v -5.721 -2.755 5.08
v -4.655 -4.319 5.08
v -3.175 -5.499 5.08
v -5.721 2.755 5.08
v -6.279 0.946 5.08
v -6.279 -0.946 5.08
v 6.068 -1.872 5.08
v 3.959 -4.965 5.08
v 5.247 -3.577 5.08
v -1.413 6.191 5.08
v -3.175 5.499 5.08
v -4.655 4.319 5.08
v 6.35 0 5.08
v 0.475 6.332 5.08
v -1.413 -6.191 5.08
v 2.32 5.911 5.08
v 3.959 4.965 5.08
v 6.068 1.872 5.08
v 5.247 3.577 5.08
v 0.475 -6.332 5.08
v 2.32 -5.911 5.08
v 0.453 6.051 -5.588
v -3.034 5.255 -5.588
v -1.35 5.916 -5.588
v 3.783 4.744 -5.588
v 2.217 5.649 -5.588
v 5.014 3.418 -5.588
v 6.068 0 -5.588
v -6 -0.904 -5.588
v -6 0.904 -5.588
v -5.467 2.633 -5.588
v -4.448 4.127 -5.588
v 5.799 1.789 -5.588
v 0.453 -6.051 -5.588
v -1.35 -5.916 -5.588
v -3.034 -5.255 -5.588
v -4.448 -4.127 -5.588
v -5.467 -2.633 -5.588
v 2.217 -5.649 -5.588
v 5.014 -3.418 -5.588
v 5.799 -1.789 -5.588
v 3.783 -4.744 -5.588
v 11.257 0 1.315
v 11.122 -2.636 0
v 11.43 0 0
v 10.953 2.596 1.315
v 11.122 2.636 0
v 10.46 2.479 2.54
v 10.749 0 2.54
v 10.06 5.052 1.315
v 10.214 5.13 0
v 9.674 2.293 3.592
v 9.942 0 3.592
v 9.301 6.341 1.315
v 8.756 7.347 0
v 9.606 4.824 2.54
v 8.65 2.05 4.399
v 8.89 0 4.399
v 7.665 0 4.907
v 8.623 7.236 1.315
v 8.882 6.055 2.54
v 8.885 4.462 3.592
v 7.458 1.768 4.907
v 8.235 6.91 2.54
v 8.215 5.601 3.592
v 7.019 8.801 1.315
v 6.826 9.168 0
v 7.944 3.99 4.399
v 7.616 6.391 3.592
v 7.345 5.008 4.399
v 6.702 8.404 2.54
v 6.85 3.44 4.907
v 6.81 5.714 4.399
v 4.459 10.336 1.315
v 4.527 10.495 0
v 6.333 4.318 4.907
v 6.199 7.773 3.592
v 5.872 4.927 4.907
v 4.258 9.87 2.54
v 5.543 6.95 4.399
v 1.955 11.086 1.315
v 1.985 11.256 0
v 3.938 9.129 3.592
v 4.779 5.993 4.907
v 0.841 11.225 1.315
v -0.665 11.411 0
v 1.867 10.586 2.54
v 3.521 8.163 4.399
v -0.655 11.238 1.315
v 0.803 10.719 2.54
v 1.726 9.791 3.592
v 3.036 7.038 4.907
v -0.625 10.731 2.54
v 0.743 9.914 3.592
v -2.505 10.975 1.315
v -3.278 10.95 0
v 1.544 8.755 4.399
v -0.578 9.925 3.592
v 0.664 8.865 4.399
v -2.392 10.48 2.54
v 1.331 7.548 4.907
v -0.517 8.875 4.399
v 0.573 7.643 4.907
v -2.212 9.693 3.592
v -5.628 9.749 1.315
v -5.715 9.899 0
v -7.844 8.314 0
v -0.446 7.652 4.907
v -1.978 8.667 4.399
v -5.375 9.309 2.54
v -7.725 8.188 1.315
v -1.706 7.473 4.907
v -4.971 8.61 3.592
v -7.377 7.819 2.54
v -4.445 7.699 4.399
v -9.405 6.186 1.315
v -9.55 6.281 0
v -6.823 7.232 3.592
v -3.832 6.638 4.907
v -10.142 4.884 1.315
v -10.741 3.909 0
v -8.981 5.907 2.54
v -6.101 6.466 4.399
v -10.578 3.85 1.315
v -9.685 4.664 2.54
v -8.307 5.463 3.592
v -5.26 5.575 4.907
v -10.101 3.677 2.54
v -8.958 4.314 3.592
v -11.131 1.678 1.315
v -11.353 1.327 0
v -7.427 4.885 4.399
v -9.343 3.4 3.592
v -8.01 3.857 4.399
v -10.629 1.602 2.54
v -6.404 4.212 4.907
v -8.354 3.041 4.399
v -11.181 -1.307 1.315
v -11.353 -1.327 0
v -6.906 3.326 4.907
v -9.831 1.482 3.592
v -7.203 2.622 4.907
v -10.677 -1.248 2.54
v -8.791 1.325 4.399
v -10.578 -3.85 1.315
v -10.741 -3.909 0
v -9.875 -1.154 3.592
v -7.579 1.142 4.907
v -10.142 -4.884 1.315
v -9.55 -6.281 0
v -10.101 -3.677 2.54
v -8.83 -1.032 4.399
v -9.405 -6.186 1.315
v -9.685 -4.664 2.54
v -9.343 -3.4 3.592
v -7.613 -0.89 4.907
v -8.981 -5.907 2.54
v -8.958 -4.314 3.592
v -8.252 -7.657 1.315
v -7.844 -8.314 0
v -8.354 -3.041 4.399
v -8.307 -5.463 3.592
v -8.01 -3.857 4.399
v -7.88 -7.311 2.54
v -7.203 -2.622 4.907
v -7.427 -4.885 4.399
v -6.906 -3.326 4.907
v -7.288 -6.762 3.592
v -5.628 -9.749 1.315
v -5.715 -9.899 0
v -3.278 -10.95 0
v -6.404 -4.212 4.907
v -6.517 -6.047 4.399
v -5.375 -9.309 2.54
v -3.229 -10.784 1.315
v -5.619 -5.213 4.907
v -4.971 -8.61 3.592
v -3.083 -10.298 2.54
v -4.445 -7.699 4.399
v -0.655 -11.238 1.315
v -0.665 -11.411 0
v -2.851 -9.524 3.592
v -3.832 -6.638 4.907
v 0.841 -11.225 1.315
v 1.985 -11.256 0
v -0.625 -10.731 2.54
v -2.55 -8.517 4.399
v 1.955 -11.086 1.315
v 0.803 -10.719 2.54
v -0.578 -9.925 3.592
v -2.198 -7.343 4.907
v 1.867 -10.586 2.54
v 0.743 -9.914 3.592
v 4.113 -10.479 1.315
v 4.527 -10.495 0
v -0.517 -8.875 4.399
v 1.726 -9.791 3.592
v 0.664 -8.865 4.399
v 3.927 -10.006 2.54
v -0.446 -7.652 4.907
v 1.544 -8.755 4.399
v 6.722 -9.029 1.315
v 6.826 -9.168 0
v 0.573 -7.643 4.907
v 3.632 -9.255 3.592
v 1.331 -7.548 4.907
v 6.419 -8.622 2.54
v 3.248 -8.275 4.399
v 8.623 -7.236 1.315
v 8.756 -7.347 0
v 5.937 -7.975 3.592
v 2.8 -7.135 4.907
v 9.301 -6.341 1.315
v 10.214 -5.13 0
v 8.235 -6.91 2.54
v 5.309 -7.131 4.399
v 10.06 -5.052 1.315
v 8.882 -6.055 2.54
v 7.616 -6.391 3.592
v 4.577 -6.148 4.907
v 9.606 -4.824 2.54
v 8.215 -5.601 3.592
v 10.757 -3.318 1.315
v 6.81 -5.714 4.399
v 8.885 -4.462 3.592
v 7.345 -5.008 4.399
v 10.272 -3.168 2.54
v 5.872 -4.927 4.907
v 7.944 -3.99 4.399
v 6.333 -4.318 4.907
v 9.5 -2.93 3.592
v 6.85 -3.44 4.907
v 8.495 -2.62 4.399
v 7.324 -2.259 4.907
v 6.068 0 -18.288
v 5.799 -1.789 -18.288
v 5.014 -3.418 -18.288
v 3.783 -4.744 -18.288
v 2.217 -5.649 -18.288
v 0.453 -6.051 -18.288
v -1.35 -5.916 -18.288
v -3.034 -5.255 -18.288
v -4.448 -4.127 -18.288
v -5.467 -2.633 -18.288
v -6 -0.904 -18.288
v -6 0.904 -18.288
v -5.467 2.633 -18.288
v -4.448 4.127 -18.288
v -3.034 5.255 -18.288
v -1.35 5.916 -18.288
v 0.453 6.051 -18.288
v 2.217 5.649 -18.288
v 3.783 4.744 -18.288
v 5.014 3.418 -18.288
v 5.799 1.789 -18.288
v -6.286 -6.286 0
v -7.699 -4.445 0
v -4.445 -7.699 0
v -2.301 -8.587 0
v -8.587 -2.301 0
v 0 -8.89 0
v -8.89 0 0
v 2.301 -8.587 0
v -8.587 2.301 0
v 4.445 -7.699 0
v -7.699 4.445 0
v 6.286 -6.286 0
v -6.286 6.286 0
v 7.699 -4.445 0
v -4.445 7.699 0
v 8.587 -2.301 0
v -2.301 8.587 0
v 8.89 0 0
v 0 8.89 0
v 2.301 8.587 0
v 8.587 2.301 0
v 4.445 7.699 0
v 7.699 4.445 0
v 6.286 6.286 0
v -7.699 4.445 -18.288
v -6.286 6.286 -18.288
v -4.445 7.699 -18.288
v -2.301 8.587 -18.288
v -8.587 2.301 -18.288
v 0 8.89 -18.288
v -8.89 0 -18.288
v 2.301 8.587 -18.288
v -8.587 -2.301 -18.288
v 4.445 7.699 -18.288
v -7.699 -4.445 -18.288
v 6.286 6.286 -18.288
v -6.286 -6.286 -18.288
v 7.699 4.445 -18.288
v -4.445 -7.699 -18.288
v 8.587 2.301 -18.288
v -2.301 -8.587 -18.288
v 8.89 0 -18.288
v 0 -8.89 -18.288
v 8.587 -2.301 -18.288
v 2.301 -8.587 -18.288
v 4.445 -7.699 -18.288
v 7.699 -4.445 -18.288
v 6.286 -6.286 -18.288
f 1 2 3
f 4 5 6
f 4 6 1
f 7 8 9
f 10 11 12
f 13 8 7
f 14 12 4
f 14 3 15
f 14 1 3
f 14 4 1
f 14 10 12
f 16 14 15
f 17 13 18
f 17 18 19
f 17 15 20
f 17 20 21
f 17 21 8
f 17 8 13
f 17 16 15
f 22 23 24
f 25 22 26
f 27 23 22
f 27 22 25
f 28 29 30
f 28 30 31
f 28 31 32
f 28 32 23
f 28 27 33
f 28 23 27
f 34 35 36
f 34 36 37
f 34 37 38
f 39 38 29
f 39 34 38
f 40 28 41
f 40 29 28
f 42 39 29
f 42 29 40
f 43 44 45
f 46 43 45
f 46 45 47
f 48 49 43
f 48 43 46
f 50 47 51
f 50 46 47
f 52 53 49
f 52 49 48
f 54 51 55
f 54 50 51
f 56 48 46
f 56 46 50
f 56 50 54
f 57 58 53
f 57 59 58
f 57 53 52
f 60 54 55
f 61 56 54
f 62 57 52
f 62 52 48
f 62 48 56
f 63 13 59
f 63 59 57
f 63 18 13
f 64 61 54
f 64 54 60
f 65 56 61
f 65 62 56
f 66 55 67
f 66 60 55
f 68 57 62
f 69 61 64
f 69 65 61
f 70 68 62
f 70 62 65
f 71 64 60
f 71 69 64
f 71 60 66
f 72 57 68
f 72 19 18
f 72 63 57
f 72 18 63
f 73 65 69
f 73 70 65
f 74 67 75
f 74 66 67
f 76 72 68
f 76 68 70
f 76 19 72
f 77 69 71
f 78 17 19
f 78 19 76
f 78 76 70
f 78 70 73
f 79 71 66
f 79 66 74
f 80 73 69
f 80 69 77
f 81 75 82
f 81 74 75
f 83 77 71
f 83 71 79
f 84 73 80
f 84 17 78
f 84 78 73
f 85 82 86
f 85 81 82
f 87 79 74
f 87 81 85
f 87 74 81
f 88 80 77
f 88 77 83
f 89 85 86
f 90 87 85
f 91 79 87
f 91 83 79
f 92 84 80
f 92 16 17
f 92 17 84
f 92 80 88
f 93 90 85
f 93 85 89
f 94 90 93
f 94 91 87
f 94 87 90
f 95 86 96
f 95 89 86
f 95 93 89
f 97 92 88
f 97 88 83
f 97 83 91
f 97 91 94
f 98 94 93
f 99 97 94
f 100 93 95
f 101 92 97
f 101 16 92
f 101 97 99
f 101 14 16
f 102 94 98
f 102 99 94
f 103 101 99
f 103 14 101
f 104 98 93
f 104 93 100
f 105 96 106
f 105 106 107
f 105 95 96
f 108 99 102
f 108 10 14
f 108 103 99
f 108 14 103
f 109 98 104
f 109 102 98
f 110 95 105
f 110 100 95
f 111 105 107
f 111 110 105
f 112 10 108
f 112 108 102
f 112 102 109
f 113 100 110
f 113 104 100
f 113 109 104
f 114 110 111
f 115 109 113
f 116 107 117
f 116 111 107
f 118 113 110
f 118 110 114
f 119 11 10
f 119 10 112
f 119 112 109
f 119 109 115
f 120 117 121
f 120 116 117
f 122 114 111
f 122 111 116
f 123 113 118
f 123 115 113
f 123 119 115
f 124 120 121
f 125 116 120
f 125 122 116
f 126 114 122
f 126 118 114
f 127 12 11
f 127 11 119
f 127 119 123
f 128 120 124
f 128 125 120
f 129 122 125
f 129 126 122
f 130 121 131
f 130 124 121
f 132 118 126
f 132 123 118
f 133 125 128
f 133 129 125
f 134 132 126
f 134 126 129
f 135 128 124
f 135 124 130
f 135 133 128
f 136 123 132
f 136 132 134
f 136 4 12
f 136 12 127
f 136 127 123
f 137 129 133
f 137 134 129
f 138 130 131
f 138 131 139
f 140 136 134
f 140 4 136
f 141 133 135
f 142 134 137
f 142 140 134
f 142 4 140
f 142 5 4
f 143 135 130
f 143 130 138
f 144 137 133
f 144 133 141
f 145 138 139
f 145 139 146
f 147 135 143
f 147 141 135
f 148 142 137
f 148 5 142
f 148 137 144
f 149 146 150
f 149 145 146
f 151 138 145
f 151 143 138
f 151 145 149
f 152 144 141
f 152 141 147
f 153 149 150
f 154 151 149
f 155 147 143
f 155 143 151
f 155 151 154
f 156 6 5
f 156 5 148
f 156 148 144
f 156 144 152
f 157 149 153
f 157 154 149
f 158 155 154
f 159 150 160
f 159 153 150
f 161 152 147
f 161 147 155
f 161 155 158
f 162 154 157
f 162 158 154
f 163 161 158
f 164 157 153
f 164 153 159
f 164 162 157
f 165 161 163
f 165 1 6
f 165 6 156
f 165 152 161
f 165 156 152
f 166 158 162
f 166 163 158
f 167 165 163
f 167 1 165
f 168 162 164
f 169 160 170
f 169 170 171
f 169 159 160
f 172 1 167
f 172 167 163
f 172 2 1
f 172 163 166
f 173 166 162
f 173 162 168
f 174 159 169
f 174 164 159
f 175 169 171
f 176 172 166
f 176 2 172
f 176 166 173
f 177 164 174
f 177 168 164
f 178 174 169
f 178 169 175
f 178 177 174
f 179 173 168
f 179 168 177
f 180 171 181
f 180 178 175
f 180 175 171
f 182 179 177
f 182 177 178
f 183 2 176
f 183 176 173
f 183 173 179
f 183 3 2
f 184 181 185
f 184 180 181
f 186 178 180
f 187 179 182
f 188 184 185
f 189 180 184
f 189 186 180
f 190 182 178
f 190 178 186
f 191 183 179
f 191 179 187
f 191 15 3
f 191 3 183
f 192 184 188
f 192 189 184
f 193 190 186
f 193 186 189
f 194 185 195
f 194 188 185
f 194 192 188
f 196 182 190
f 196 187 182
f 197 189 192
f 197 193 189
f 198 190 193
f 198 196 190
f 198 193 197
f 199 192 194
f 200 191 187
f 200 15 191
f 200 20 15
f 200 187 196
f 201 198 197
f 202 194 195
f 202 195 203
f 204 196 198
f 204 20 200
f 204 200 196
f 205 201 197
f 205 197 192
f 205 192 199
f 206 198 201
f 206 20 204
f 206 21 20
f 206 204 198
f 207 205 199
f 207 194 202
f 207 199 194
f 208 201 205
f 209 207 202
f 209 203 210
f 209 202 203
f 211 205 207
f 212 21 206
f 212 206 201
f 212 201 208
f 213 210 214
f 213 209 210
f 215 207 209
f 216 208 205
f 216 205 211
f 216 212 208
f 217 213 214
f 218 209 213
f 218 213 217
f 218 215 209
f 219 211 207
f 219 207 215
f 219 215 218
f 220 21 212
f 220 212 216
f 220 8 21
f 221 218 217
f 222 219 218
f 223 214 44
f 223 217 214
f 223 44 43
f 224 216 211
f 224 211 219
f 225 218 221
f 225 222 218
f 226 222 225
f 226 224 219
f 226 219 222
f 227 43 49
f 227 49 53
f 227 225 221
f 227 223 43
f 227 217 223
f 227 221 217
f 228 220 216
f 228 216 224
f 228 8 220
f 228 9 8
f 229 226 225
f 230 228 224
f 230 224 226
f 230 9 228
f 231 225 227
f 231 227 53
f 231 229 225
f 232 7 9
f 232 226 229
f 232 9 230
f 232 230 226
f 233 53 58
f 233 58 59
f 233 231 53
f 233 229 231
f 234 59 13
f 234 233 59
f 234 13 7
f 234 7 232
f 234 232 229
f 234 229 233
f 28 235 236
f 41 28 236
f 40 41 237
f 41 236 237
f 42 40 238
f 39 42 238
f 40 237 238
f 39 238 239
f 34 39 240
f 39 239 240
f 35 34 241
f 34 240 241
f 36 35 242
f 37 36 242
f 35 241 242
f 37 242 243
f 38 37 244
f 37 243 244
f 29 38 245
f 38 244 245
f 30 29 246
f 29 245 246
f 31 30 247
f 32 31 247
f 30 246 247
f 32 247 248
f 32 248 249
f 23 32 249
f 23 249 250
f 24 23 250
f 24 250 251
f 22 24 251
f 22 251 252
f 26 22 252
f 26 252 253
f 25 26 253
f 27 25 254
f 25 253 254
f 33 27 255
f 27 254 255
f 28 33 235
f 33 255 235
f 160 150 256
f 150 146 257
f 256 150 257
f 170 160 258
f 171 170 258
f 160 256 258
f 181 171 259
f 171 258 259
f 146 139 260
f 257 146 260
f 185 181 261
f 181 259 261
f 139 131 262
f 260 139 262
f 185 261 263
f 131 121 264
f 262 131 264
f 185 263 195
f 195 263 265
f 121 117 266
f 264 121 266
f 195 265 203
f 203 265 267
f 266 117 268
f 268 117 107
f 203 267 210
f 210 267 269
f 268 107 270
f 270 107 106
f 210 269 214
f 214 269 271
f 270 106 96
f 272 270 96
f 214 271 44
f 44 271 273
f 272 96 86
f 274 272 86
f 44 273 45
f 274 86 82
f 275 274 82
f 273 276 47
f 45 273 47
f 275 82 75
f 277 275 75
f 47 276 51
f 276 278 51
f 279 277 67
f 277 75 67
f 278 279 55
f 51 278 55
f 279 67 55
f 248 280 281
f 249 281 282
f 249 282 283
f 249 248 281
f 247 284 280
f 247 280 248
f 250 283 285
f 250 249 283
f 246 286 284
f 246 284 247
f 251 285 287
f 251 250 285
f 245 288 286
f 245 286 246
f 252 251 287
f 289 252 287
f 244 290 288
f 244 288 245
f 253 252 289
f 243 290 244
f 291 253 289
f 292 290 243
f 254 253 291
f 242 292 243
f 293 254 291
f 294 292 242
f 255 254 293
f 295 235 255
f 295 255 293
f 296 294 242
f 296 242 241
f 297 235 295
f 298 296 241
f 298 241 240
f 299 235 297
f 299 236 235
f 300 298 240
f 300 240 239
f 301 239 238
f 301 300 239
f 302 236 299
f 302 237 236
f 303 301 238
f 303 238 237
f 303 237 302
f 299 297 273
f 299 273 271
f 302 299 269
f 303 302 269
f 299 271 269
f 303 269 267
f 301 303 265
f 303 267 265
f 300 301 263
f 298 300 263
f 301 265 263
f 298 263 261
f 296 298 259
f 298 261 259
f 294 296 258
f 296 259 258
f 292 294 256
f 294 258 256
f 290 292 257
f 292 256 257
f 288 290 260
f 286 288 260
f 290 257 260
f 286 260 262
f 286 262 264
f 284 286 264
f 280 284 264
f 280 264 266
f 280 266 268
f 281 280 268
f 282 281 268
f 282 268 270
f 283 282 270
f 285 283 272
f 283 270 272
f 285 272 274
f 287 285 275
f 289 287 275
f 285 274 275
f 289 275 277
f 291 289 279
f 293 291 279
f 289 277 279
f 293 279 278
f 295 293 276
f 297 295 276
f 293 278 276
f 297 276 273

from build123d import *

# Parameters (mm, degrees)
F0_R     = 11.43
F1_DEPTH = 5.08
F2_R     = 5.07999
F3_R     = 8.89
F4_DEPTH = 18.288
F5_R     = 6.0681762548
F6_DEPTH = 12.7


# Not quite as in the source:
# - a fillet or chamfer is up to 0.001 mm smaller than in the source, because OpenCascade refuses the exact size


with BuildPart() as f1:
    # F0 (on Top) → F1 (new body)
    with BuildSketch(Plane.XY):
        Circle(F0_R)
    extrude(amount=F1_DEPTH)

    # F2 (radius 5.08 in the source; OpenCascade refuses exactly that, so slightly less here)
    f2_edges = [f1.edges().sort_by_distance(p)[0] for p in [
        (-11.43, 0, 5.08),
    ]]
    fillet(f2_edges, radius=F2_R)

    # F3 (on face) → F4 (join)
    with BuildSketch(Plane(origin=(0, 0, 0), x_dir=(1, 0, 0), z_dir=(0, 0, -1))):
        Circle(F3_R)
    extrude(amount=F4_DEPTH)

    # F5 (on face) → F6 (cut)
    with BuildSketch(Plane(origin=(0, 0, -18.288), x_dir=(1, 0, 0), z_dir=(0, 0, -1))):
        Circle(F5_R)
    extrude(amount=-F6_DEPTH, mode=Mode.SUBTRACT)


solid = f1.part
